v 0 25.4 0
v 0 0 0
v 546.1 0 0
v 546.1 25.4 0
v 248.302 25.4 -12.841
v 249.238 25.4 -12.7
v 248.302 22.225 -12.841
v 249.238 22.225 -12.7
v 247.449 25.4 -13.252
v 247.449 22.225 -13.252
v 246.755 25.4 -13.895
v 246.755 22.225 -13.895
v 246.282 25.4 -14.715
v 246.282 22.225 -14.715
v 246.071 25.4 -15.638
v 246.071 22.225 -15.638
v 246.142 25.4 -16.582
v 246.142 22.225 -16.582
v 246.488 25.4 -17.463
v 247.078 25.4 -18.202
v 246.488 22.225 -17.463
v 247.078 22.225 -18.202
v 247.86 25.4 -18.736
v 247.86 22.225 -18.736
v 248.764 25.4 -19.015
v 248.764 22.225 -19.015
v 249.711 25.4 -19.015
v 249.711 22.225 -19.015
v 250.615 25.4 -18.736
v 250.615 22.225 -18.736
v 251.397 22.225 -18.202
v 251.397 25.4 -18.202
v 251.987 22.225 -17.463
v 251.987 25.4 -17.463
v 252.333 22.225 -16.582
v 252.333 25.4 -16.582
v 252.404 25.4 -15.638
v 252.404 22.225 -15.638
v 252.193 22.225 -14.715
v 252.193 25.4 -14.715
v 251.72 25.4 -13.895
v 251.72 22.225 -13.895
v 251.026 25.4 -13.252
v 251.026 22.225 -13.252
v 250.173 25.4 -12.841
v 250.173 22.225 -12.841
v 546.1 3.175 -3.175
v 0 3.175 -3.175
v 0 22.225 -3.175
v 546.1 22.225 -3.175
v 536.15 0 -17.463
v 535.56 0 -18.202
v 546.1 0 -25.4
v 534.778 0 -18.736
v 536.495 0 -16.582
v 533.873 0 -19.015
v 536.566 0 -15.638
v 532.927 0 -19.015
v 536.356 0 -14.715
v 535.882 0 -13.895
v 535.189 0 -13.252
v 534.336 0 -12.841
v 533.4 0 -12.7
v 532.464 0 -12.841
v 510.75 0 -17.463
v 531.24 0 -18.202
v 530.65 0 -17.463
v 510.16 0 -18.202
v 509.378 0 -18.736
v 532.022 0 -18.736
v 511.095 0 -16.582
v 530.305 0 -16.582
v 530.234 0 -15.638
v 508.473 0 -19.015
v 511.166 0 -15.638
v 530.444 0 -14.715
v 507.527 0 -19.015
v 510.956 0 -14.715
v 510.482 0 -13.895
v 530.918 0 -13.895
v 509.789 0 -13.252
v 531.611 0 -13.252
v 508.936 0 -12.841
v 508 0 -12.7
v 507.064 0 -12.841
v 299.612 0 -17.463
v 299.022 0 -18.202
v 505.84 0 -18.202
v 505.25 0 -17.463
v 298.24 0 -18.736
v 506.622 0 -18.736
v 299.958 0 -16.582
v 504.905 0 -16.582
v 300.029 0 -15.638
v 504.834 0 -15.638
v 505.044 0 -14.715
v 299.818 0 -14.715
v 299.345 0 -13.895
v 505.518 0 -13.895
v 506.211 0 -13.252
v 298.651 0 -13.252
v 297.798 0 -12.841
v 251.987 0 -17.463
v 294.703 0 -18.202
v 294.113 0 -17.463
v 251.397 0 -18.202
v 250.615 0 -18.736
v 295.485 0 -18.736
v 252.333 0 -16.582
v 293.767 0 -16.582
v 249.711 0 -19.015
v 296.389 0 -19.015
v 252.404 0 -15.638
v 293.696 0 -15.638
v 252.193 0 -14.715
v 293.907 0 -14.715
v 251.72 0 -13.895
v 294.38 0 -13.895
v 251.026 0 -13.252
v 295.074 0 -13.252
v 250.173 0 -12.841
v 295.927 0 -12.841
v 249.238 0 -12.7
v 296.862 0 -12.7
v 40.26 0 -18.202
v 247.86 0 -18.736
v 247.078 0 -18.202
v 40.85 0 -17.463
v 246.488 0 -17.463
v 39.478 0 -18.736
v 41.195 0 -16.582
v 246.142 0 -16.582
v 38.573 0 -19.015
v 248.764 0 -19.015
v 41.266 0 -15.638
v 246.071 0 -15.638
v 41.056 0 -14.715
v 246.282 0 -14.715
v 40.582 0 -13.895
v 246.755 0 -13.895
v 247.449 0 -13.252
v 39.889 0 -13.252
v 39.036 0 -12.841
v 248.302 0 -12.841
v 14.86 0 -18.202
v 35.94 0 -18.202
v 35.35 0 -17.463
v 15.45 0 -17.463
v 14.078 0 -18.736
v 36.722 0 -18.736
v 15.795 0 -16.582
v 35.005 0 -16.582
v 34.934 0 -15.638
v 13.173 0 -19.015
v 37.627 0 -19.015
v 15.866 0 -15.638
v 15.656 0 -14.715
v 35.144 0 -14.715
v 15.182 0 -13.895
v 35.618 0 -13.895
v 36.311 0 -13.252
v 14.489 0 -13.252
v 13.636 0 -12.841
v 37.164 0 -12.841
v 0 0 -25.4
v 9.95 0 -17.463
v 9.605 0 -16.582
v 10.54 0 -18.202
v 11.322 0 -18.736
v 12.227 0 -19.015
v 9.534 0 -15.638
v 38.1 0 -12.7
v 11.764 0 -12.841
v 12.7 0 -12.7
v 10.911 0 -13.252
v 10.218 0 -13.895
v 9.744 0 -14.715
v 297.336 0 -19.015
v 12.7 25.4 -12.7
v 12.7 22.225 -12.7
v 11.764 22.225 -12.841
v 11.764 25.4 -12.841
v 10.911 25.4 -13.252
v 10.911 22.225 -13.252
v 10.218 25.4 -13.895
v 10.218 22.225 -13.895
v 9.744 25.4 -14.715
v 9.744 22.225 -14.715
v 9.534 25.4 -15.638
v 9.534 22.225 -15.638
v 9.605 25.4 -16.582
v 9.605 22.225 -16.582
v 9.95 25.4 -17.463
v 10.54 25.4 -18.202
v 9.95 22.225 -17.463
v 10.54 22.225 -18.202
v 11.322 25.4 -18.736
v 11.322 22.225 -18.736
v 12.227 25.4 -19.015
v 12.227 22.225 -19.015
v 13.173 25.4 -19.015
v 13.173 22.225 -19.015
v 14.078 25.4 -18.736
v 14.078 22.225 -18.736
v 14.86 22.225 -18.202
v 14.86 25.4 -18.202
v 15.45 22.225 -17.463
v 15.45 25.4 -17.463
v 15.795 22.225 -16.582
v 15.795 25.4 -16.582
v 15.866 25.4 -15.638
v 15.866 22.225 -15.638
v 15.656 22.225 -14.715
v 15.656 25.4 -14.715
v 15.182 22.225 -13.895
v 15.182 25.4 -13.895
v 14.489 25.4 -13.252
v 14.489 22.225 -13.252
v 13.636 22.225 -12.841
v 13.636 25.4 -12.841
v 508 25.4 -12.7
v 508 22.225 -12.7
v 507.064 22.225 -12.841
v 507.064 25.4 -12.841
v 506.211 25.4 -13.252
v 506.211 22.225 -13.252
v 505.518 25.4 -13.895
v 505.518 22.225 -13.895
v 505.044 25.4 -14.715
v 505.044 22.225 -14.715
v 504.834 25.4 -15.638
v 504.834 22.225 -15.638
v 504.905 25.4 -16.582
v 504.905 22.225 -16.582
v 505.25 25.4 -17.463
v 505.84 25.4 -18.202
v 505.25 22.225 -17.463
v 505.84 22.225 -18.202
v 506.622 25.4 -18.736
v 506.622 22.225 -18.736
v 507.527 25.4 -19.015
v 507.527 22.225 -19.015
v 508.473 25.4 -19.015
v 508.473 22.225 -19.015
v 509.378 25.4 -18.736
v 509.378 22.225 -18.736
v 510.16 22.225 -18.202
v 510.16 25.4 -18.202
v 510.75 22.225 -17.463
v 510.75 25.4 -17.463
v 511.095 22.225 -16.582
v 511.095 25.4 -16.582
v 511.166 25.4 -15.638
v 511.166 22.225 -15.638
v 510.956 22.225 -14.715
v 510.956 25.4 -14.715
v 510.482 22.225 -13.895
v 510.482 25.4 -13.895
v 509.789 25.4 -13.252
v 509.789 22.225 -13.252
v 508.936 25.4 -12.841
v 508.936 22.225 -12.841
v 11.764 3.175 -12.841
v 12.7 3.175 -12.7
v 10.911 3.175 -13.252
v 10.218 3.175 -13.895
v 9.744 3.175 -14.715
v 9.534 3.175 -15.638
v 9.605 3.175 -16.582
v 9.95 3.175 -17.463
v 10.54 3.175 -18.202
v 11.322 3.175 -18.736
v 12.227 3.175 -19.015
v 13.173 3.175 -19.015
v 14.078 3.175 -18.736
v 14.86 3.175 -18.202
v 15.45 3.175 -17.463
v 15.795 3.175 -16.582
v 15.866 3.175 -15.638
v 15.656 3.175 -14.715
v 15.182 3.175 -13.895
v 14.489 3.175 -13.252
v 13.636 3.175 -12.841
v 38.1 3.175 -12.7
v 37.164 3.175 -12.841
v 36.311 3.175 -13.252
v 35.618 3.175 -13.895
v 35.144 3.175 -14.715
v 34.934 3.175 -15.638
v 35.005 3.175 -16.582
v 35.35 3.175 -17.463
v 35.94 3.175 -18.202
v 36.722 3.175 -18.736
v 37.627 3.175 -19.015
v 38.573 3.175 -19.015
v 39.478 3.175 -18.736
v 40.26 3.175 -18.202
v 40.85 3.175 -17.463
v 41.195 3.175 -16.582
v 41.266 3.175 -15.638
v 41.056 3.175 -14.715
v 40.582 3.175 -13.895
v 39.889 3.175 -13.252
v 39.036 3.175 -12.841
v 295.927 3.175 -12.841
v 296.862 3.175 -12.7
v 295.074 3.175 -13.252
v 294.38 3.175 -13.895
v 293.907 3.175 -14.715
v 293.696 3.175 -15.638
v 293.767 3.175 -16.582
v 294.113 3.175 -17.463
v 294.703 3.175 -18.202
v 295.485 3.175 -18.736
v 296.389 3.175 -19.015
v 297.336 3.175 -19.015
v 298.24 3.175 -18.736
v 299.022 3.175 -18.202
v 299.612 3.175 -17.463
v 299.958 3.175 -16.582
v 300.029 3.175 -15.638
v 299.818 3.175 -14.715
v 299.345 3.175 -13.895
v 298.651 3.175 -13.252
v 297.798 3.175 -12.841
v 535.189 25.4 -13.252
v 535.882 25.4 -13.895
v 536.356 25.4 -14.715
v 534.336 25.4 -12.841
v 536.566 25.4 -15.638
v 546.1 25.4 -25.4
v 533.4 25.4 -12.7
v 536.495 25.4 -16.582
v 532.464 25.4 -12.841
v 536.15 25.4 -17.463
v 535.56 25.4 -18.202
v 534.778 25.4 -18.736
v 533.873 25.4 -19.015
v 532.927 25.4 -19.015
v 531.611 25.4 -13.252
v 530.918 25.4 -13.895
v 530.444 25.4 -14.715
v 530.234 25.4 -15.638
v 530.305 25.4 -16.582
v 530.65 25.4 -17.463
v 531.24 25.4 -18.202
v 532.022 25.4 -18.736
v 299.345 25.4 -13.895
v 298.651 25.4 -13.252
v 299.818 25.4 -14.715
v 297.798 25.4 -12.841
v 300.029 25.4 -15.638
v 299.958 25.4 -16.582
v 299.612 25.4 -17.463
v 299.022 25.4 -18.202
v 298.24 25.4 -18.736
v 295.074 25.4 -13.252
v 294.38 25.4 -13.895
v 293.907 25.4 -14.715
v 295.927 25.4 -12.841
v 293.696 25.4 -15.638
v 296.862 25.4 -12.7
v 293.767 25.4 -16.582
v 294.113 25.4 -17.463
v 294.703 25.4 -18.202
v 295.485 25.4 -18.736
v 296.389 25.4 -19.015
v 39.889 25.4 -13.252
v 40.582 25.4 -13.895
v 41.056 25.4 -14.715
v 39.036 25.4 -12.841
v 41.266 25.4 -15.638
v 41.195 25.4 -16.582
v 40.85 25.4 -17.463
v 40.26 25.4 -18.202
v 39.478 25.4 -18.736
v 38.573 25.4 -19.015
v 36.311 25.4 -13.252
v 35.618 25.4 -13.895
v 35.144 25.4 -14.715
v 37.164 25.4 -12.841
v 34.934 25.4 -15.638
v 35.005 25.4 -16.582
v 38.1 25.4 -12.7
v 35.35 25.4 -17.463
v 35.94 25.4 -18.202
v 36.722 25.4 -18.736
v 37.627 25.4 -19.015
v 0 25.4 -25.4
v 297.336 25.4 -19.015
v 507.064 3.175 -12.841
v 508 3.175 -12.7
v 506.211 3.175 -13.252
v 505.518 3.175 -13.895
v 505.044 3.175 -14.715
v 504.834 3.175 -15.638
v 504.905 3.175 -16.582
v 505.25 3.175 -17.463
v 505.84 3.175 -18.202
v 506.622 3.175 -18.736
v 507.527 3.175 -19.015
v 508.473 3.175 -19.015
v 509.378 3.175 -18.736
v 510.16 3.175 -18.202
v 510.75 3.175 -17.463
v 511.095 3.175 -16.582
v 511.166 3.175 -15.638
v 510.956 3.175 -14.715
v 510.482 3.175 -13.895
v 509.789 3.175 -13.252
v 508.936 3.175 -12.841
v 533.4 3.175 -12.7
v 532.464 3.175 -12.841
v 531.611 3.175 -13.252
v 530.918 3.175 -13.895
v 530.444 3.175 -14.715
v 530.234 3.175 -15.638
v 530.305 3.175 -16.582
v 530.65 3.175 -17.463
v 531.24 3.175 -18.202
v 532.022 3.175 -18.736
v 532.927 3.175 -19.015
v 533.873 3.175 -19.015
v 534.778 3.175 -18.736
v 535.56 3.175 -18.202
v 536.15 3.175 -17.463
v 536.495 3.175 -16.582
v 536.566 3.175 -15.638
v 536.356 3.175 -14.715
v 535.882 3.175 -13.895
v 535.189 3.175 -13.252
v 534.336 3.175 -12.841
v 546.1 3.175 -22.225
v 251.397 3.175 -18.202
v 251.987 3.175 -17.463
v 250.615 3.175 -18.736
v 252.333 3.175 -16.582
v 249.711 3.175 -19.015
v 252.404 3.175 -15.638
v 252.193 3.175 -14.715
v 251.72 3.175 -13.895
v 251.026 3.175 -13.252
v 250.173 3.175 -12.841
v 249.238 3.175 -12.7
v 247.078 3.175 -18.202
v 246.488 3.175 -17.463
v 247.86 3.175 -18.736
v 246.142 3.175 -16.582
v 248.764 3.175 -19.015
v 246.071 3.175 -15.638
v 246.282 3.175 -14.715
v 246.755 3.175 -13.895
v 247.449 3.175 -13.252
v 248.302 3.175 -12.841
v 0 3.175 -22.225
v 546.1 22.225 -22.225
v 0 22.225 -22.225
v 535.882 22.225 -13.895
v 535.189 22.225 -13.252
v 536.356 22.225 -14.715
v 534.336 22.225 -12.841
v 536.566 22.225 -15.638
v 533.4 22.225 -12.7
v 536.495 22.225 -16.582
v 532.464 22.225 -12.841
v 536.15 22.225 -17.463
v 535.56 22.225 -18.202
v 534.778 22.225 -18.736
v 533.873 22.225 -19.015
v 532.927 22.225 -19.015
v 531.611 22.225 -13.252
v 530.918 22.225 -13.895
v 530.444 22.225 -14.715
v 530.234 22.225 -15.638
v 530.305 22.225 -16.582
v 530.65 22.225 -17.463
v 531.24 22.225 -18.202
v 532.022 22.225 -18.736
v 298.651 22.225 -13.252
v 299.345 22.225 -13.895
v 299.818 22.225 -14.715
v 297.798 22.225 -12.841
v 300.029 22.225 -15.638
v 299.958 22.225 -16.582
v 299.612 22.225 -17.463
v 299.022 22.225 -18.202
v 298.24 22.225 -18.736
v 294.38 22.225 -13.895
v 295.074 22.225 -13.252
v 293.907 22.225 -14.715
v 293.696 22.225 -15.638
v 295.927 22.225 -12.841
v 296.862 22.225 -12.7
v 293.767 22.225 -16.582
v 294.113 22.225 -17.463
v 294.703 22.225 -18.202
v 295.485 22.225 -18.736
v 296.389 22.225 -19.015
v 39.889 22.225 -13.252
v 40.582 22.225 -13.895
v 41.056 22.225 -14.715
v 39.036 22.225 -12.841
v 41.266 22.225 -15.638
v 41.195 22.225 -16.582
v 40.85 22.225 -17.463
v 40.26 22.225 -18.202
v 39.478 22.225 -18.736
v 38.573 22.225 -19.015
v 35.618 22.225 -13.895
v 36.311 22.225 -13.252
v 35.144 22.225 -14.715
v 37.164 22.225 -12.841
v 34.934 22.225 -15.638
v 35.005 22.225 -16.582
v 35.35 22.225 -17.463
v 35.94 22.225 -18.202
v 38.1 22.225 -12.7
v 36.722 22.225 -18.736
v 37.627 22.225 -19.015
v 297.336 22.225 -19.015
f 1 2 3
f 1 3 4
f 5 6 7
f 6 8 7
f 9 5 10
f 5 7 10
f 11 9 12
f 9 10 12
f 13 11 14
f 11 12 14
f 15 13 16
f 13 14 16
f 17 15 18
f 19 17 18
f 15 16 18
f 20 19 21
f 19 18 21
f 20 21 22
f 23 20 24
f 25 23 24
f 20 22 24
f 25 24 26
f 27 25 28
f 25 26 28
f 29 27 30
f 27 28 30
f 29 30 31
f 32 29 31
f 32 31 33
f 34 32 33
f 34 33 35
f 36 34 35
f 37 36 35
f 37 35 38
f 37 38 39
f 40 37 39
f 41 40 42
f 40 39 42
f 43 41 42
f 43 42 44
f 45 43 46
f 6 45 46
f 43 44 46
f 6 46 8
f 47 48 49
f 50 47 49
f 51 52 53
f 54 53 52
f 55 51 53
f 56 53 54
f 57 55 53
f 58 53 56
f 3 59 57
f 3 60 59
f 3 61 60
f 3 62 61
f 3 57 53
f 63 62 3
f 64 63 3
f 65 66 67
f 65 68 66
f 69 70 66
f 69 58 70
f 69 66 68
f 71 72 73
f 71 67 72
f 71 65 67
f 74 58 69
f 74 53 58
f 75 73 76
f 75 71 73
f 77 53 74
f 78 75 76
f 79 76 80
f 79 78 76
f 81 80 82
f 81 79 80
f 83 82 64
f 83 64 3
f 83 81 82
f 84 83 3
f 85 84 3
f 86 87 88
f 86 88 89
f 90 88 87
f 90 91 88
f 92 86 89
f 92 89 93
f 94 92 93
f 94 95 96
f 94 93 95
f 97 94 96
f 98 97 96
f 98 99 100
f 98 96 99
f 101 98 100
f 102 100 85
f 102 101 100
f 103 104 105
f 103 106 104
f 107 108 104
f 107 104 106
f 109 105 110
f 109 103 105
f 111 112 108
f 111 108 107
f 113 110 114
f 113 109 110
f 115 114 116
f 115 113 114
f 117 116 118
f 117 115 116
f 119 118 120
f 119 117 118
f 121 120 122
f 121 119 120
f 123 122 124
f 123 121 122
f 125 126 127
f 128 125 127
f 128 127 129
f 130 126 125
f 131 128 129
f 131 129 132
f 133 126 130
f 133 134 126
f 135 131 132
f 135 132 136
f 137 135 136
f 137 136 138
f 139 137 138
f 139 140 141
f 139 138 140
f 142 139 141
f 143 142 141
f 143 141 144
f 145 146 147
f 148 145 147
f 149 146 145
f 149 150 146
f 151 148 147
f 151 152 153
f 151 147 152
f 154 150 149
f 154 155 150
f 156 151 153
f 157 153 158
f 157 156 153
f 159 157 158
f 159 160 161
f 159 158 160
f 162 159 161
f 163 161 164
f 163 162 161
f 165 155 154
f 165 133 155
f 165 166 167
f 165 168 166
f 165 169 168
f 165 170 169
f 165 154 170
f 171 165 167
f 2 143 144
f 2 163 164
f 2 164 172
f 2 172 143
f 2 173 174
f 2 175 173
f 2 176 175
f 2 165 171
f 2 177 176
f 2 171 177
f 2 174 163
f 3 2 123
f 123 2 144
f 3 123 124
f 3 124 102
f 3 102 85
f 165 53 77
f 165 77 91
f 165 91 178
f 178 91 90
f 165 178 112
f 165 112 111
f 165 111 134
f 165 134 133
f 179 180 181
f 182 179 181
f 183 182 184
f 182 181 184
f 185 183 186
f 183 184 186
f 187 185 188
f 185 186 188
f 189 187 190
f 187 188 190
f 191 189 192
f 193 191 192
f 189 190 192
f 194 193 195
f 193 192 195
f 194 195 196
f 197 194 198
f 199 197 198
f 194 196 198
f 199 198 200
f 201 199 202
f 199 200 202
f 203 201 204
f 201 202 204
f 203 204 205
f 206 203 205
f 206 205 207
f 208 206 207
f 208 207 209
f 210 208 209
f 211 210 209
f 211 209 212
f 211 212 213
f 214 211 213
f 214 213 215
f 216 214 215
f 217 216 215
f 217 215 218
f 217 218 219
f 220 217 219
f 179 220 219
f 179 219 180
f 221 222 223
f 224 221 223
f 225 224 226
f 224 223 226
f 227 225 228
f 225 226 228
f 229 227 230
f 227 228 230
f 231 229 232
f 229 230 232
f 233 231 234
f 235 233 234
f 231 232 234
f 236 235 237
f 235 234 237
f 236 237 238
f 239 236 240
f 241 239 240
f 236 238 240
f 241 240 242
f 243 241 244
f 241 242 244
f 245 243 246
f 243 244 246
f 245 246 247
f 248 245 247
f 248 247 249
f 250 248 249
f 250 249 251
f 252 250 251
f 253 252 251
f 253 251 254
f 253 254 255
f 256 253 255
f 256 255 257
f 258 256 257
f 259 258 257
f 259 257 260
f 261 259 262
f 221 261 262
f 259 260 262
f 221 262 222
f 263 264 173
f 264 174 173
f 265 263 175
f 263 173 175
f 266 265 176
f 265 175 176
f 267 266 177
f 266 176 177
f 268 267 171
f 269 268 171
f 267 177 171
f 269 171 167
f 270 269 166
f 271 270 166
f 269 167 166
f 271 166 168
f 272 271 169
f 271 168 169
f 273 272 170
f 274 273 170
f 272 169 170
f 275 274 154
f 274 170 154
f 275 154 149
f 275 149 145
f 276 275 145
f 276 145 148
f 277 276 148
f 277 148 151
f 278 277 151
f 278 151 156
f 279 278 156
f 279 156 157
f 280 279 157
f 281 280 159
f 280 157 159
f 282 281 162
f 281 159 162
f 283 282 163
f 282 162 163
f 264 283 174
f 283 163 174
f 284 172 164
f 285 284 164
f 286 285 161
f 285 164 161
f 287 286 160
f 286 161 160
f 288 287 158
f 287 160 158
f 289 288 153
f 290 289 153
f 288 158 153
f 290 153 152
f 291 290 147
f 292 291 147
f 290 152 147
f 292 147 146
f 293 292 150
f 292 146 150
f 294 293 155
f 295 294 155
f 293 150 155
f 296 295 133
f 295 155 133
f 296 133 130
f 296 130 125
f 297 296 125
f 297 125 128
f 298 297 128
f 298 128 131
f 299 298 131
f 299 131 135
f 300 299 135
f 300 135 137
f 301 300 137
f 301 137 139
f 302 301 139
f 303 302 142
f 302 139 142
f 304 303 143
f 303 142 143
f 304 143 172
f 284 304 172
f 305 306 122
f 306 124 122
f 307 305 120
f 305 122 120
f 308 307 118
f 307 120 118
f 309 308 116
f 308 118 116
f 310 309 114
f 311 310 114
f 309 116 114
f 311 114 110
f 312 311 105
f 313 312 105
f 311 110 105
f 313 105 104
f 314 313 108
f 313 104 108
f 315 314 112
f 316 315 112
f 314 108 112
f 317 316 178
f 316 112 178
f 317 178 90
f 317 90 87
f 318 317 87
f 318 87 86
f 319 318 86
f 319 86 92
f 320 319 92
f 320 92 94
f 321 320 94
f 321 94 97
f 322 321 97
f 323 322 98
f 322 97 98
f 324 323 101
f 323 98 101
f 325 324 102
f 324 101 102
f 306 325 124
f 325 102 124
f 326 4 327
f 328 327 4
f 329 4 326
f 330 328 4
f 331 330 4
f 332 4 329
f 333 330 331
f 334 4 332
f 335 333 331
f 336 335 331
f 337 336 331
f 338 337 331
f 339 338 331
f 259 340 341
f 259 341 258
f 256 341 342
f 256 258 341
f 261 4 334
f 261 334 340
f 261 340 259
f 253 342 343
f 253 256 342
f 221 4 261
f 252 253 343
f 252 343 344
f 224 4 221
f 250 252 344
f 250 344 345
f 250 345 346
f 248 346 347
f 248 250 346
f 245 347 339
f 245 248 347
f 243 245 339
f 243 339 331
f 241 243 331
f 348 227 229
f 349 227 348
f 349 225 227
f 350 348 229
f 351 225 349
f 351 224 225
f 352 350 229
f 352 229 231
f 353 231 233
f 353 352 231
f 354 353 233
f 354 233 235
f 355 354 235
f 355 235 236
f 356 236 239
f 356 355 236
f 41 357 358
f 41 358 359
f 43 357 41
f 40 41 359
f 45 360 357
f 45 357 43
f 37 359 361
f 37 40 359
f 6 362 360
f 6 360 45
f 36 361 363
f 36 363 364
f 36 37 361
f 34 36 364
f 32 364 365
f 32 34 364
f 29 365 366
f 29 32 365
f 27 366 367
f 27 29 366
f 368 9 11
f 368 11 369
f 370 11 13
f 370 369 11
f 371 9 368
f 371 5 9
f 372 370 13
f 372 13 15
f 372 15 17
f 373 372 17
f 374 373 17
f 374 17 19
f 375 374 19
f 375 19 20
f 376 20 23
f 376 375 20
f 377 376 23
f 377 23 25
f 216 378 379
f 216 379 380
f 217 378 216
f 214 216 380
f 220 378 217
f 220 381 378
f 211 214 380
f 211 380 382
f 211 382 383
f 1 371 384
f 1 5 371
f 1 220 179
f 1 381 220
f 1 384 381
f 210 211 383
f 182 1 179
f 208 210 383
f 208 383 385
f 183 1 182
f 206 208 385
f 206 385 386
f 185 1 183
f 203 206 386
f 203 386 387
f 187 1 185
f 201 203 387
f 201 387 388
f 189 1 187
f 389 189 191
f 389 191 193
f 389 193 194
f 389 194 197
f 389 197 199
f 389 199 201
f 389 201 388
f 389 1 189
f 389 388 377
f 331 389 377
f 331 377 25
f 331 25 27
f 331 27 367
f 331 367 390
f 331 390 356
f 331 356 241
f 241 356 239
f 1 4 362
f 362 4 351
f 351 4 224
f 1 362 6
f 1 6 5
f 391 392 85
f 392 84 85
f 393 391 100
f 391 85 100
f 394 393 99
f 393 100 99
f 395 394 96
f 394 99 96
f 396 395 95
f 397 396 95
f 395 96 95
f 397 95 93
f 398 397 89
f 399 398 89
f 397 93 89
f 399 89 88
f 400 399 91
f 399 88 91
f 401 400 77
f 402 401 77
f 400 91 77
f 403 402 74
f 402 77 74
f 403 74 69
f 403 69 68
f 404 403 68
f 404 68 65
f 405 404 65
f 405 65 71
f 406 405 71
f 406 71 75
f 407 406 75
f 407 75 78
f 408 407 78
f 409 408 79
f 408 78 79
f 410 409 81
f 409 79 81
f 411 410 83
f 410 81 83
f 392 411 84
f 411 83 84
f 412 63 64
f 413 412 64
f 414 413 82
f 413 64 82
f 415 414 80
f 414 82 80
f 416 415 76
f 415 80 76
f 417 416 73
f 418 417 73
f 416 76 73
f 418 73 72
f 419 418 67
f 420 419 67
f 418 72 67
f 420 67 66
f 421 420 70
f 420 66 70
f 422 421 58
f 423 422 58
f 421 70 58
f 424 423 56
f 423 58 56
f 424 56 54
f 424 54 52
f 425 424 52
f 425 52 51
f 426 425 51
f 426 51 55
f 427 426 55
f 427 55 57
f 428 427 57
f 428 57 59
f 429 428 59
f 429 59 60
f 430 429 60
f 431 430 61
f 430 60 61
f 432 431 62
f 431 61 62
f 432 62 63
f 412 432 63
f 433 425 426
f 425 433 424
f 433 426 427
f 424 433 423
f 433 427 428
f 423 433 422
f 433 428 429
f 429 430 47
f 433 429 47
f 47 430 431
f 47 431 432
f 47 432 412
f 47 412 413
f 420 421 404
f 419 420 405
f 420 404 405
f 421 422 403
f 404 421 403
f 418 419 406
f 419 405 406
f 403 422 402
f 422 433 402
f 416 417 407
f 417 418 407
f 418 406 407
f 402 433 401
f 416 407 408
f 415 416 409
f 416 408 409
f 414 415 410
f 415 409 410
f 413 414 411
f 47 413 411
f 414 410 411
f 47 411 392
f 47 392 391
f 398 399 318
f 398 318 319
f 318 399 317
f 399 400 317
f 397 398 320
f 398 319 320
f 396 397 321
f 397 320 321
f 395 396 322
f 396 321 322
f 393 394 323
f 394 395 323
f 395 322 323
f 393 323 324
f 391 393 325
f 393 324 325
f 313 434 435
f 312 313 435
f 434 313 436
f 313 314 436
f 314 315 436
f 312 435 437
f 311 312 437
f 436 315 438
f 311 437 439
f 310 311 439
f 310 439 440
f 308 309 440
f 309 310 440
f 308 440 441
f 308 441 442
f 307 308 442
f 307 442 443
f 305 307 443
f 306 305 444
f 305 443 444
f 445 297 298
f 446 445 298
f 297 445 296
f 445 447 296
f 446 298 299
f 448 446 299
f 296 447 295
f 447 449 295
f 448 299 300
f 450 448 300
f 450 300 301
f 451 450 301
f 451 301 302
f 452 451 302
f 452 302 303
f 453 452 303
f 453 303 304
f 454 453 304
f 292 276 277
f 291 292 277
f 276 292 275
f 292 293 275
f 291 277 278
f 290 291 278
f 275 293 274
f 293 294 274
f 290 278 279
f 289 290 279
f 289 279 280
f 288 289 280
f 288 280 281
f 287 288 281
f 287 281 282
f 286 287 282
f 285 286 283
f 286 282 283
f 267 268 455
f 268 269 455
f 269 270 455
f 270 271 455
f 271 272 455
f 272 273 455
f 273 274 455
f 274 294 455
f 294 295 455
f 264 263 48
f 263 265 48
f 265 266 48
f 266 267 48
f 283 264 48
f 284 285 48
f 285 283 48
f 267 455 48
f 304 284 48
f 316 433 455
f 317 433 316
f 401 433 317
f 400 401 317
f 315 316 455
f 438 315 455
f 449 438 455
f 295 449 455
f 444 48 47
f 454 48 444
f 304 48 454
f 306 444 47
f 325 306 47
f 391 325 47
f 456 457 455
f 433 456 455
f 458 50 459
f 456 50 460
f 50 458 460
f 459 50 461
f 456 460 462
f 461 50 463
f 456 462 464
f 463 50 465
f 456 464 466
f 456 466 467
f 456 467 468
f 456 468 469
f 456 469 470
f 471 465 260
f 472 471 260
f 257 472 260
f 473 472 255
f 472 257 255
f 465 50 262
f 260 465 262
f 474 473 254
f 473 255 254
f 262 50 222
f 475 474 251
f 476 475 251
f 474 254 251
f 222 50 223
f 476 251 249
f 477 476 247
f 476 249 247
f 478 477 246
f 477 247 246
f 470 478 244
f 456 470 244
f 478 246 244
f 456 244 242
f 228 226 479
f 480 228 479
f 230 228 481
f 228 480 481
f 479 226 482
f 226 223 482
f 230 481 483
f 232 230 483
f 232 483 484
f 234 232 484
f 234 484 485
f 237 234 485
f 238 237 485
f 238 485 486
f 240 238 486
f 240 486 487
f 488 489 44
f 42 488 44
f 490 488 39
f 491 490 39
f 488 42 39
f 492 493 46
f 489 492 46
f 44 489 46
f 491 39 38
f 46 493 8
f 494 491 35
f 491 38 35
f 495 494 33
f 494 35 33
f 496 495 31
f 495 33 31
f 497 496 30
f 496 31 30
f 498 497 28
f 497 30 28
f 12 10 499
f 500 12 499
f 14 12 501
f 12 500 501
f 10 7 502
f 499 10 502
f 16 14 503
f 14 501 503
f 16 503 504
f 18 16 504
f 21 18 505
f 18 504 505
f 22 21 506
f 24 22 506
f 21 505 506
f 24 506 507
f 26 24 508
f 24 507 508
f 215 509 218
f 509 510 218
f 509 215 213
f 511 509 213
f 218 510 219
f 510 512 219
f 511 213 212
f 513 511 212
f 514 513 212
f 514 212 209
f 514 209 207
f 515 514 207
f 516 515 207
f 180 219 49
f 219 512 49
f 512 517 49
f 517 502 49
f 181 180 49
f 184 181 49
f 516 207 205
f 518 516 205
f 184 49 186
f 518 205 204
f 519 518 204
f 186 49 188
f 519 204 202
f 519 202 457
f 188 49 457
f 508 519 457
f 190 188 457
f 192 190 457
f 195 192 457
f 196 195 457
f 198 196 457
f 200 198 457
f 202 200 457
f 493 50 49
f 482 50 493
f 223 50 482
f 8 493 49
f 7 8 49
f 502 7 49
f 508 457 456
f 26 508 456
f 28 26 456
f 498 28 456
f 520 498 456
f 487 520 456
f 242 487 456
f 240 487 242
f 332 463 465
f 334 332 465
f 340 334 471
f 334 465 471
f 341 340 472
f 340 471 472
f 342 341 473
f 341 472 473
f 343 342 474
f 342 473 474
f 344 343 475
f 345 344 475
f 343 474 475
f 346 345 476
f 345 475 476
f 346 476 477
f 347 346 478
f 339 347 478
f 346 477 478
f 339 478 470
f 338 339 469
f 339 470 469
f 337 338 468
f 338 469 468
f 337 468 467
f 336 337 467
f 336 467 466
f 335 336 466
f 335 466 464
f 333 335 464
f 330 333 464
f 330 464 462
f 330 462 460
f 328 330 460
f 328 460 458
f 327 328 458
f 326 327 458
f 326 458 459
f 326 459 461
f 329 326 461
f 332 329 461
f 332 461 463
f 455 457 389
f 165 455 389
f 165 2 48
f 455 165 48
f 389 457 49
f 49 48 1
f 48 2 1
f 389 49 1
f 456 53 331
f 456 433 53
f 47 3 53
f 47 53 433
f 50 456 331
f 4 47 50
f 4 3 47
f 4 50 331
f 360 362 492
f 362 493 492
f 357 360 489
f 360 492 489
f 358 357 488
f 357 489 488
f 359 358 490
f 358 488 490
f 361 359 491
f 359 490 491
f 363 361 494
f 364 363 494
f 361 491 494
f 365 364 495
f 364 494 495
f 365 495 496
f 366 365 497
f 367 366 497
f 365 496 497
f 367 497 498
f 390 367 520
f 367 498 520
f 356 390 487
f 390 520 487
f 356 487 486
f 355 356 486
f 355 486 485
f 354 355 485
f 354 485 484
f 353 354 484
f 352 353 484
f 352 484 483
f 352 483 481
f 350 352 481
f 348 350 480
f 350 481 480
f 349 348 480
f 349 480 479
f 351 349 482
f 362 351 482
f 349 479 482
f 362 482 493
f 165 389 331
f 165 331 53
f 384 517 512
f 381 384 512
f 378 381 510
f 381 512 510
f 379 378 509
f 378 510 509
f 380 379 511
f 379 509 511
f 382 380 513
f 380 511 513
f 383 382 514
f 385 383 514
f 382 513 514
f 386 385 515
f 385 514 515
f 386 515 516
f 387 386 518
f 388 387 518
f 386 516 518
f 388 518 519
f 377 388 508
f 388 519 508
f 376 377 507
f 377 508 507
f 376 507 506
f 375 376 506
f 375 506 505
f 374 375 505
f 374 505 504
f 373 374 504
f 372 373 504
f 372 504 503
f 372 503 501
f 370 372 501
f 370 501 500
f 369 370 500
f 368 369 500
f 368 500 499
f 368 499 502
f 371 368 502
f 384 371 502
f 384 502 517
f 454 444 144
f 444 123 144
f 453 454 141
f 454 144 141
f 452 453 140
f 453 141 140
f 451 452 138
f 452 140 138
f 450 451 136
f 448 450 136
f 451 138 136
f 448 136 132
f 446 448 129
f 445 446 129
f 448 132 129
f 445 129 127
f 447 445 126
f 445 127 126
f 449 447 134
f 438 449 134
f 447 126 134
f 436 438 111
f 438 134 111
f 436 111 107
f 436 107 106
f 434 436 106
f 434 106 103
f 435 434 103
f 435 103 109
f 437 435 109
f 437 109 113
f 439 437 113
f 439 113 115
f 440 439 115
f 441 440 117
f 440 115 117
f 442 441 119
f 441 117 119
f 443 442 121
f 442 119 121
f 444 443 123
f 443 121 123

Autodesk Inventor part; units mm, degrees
ref_plane "YZ Plane" through (0, 0, 0) normal (1, 0, 0) x (0, 1, 0)
ref_plane "XZ Plane" through (0, 0, 0) normal (0, 1, 0) x (-1, 0, 0)
ref_plane "XY Plane" through (0, 0, 0) normal (0, 0, 1) x (1, 0, 0)
sketch "Sketch1" plane through (0, 0, 0) normal (1, 0, 0) x (0, 1, 0)
  line L0 (0, 0) -> (25.4, 0)
  line L1 (25.4, 0) -> (25.4, -25.4)
  line L2 (25.4, -25.4) -> (0, -25.4)
  line L3 (0, -25.4) -> (0, 0)
  line L4 (3.175, -3.175) -> (22.225, -3.175)
  line L5 (22.225, -3.175) -> (22.225, -22.225)
  line L6 (22.225, -22.225) -> (3.175, -22.225)
  line L7 (3.175, -22.225) -> (3.175, -3.175)
  dimension "d0" = 25.4
  dimension "d1" = 25.4
  dimension "d2" = 19.05
  dimension "d3" = 19.05
  dimension "d4" = 3.175
  dimension "d5" = 3.175
extrude "Extrusion1" add sketch "Sketch1" along normal blind 546.1
sketch "Sketch2" plane through (0, 25.4, 0) normal (0, 1, 0) x (1, 0, 0)
  line L0 (0, 0) -> (0, 25.4) projected
  line L1 (0, 0) -> (546.1, 0) projected
  line L2 (546.1, 25.4) -> (546.1, 0) projected
  line L3 (0, 25.4) -> (546.1, 25.4) projected
  point P0 (12.7, 15.875)
  point P1 (533.4, 15.875)
  dimension "d8" = 15.875
  dimension "d9" = 12.7
  dimension "d10" = 12.7
  dimension "d11" = 15.875
hole "Hole1" at (12.7, 25.4, -15.875) at (533.4, 25.4, -15.875) direction (0, -1, 0) diameter 6.35 end through all
sketch "Sketch3" plane through (0, 25.4, 0) normal (0, 1, 0) x (1, 0, 0)
  circle A0 centre (12.7, 15.875) radius 3.175 projected
  circle A1 centre (533.4, 15.875) radius 3.175 projected
  line L0 (0, 0) -> (0, 25.4) projected
  line L1 (0, 0) -> (546.1, 0) projected
  line L2 (546.1, 25.4) -> (546.1, 0) projected
  line L3 (0, 25.4) -> (546.1, 25.4) projected
  point P0 (38.1, 15.875)
  point P1 (508, 15.875)
  point P2 (296.8625, 15.875)
  point P3 (249.2375, 15.875)
  dimension "d19" = 38.1
  dimension "d20" = 38.1
  dimension "d21" = 15.875
  dimension "d22" = 15.875
  dimension "d30" = 15.875
  dimension "d31" = 249.2375
  dimension "d39" = 249.2375
  dimension "d40" = 15.875
hole "Hole4" at (38.1, 25.4, -15.875) at (508, 25.4, -15.875) at (296.8625, 25.4, -15.875) at (249.2375, 25.4, -15.875) direction (0, -1, 0) diameter 6.35 end through all
properties part number "mounting block medium" material "Aluminum 6061"
